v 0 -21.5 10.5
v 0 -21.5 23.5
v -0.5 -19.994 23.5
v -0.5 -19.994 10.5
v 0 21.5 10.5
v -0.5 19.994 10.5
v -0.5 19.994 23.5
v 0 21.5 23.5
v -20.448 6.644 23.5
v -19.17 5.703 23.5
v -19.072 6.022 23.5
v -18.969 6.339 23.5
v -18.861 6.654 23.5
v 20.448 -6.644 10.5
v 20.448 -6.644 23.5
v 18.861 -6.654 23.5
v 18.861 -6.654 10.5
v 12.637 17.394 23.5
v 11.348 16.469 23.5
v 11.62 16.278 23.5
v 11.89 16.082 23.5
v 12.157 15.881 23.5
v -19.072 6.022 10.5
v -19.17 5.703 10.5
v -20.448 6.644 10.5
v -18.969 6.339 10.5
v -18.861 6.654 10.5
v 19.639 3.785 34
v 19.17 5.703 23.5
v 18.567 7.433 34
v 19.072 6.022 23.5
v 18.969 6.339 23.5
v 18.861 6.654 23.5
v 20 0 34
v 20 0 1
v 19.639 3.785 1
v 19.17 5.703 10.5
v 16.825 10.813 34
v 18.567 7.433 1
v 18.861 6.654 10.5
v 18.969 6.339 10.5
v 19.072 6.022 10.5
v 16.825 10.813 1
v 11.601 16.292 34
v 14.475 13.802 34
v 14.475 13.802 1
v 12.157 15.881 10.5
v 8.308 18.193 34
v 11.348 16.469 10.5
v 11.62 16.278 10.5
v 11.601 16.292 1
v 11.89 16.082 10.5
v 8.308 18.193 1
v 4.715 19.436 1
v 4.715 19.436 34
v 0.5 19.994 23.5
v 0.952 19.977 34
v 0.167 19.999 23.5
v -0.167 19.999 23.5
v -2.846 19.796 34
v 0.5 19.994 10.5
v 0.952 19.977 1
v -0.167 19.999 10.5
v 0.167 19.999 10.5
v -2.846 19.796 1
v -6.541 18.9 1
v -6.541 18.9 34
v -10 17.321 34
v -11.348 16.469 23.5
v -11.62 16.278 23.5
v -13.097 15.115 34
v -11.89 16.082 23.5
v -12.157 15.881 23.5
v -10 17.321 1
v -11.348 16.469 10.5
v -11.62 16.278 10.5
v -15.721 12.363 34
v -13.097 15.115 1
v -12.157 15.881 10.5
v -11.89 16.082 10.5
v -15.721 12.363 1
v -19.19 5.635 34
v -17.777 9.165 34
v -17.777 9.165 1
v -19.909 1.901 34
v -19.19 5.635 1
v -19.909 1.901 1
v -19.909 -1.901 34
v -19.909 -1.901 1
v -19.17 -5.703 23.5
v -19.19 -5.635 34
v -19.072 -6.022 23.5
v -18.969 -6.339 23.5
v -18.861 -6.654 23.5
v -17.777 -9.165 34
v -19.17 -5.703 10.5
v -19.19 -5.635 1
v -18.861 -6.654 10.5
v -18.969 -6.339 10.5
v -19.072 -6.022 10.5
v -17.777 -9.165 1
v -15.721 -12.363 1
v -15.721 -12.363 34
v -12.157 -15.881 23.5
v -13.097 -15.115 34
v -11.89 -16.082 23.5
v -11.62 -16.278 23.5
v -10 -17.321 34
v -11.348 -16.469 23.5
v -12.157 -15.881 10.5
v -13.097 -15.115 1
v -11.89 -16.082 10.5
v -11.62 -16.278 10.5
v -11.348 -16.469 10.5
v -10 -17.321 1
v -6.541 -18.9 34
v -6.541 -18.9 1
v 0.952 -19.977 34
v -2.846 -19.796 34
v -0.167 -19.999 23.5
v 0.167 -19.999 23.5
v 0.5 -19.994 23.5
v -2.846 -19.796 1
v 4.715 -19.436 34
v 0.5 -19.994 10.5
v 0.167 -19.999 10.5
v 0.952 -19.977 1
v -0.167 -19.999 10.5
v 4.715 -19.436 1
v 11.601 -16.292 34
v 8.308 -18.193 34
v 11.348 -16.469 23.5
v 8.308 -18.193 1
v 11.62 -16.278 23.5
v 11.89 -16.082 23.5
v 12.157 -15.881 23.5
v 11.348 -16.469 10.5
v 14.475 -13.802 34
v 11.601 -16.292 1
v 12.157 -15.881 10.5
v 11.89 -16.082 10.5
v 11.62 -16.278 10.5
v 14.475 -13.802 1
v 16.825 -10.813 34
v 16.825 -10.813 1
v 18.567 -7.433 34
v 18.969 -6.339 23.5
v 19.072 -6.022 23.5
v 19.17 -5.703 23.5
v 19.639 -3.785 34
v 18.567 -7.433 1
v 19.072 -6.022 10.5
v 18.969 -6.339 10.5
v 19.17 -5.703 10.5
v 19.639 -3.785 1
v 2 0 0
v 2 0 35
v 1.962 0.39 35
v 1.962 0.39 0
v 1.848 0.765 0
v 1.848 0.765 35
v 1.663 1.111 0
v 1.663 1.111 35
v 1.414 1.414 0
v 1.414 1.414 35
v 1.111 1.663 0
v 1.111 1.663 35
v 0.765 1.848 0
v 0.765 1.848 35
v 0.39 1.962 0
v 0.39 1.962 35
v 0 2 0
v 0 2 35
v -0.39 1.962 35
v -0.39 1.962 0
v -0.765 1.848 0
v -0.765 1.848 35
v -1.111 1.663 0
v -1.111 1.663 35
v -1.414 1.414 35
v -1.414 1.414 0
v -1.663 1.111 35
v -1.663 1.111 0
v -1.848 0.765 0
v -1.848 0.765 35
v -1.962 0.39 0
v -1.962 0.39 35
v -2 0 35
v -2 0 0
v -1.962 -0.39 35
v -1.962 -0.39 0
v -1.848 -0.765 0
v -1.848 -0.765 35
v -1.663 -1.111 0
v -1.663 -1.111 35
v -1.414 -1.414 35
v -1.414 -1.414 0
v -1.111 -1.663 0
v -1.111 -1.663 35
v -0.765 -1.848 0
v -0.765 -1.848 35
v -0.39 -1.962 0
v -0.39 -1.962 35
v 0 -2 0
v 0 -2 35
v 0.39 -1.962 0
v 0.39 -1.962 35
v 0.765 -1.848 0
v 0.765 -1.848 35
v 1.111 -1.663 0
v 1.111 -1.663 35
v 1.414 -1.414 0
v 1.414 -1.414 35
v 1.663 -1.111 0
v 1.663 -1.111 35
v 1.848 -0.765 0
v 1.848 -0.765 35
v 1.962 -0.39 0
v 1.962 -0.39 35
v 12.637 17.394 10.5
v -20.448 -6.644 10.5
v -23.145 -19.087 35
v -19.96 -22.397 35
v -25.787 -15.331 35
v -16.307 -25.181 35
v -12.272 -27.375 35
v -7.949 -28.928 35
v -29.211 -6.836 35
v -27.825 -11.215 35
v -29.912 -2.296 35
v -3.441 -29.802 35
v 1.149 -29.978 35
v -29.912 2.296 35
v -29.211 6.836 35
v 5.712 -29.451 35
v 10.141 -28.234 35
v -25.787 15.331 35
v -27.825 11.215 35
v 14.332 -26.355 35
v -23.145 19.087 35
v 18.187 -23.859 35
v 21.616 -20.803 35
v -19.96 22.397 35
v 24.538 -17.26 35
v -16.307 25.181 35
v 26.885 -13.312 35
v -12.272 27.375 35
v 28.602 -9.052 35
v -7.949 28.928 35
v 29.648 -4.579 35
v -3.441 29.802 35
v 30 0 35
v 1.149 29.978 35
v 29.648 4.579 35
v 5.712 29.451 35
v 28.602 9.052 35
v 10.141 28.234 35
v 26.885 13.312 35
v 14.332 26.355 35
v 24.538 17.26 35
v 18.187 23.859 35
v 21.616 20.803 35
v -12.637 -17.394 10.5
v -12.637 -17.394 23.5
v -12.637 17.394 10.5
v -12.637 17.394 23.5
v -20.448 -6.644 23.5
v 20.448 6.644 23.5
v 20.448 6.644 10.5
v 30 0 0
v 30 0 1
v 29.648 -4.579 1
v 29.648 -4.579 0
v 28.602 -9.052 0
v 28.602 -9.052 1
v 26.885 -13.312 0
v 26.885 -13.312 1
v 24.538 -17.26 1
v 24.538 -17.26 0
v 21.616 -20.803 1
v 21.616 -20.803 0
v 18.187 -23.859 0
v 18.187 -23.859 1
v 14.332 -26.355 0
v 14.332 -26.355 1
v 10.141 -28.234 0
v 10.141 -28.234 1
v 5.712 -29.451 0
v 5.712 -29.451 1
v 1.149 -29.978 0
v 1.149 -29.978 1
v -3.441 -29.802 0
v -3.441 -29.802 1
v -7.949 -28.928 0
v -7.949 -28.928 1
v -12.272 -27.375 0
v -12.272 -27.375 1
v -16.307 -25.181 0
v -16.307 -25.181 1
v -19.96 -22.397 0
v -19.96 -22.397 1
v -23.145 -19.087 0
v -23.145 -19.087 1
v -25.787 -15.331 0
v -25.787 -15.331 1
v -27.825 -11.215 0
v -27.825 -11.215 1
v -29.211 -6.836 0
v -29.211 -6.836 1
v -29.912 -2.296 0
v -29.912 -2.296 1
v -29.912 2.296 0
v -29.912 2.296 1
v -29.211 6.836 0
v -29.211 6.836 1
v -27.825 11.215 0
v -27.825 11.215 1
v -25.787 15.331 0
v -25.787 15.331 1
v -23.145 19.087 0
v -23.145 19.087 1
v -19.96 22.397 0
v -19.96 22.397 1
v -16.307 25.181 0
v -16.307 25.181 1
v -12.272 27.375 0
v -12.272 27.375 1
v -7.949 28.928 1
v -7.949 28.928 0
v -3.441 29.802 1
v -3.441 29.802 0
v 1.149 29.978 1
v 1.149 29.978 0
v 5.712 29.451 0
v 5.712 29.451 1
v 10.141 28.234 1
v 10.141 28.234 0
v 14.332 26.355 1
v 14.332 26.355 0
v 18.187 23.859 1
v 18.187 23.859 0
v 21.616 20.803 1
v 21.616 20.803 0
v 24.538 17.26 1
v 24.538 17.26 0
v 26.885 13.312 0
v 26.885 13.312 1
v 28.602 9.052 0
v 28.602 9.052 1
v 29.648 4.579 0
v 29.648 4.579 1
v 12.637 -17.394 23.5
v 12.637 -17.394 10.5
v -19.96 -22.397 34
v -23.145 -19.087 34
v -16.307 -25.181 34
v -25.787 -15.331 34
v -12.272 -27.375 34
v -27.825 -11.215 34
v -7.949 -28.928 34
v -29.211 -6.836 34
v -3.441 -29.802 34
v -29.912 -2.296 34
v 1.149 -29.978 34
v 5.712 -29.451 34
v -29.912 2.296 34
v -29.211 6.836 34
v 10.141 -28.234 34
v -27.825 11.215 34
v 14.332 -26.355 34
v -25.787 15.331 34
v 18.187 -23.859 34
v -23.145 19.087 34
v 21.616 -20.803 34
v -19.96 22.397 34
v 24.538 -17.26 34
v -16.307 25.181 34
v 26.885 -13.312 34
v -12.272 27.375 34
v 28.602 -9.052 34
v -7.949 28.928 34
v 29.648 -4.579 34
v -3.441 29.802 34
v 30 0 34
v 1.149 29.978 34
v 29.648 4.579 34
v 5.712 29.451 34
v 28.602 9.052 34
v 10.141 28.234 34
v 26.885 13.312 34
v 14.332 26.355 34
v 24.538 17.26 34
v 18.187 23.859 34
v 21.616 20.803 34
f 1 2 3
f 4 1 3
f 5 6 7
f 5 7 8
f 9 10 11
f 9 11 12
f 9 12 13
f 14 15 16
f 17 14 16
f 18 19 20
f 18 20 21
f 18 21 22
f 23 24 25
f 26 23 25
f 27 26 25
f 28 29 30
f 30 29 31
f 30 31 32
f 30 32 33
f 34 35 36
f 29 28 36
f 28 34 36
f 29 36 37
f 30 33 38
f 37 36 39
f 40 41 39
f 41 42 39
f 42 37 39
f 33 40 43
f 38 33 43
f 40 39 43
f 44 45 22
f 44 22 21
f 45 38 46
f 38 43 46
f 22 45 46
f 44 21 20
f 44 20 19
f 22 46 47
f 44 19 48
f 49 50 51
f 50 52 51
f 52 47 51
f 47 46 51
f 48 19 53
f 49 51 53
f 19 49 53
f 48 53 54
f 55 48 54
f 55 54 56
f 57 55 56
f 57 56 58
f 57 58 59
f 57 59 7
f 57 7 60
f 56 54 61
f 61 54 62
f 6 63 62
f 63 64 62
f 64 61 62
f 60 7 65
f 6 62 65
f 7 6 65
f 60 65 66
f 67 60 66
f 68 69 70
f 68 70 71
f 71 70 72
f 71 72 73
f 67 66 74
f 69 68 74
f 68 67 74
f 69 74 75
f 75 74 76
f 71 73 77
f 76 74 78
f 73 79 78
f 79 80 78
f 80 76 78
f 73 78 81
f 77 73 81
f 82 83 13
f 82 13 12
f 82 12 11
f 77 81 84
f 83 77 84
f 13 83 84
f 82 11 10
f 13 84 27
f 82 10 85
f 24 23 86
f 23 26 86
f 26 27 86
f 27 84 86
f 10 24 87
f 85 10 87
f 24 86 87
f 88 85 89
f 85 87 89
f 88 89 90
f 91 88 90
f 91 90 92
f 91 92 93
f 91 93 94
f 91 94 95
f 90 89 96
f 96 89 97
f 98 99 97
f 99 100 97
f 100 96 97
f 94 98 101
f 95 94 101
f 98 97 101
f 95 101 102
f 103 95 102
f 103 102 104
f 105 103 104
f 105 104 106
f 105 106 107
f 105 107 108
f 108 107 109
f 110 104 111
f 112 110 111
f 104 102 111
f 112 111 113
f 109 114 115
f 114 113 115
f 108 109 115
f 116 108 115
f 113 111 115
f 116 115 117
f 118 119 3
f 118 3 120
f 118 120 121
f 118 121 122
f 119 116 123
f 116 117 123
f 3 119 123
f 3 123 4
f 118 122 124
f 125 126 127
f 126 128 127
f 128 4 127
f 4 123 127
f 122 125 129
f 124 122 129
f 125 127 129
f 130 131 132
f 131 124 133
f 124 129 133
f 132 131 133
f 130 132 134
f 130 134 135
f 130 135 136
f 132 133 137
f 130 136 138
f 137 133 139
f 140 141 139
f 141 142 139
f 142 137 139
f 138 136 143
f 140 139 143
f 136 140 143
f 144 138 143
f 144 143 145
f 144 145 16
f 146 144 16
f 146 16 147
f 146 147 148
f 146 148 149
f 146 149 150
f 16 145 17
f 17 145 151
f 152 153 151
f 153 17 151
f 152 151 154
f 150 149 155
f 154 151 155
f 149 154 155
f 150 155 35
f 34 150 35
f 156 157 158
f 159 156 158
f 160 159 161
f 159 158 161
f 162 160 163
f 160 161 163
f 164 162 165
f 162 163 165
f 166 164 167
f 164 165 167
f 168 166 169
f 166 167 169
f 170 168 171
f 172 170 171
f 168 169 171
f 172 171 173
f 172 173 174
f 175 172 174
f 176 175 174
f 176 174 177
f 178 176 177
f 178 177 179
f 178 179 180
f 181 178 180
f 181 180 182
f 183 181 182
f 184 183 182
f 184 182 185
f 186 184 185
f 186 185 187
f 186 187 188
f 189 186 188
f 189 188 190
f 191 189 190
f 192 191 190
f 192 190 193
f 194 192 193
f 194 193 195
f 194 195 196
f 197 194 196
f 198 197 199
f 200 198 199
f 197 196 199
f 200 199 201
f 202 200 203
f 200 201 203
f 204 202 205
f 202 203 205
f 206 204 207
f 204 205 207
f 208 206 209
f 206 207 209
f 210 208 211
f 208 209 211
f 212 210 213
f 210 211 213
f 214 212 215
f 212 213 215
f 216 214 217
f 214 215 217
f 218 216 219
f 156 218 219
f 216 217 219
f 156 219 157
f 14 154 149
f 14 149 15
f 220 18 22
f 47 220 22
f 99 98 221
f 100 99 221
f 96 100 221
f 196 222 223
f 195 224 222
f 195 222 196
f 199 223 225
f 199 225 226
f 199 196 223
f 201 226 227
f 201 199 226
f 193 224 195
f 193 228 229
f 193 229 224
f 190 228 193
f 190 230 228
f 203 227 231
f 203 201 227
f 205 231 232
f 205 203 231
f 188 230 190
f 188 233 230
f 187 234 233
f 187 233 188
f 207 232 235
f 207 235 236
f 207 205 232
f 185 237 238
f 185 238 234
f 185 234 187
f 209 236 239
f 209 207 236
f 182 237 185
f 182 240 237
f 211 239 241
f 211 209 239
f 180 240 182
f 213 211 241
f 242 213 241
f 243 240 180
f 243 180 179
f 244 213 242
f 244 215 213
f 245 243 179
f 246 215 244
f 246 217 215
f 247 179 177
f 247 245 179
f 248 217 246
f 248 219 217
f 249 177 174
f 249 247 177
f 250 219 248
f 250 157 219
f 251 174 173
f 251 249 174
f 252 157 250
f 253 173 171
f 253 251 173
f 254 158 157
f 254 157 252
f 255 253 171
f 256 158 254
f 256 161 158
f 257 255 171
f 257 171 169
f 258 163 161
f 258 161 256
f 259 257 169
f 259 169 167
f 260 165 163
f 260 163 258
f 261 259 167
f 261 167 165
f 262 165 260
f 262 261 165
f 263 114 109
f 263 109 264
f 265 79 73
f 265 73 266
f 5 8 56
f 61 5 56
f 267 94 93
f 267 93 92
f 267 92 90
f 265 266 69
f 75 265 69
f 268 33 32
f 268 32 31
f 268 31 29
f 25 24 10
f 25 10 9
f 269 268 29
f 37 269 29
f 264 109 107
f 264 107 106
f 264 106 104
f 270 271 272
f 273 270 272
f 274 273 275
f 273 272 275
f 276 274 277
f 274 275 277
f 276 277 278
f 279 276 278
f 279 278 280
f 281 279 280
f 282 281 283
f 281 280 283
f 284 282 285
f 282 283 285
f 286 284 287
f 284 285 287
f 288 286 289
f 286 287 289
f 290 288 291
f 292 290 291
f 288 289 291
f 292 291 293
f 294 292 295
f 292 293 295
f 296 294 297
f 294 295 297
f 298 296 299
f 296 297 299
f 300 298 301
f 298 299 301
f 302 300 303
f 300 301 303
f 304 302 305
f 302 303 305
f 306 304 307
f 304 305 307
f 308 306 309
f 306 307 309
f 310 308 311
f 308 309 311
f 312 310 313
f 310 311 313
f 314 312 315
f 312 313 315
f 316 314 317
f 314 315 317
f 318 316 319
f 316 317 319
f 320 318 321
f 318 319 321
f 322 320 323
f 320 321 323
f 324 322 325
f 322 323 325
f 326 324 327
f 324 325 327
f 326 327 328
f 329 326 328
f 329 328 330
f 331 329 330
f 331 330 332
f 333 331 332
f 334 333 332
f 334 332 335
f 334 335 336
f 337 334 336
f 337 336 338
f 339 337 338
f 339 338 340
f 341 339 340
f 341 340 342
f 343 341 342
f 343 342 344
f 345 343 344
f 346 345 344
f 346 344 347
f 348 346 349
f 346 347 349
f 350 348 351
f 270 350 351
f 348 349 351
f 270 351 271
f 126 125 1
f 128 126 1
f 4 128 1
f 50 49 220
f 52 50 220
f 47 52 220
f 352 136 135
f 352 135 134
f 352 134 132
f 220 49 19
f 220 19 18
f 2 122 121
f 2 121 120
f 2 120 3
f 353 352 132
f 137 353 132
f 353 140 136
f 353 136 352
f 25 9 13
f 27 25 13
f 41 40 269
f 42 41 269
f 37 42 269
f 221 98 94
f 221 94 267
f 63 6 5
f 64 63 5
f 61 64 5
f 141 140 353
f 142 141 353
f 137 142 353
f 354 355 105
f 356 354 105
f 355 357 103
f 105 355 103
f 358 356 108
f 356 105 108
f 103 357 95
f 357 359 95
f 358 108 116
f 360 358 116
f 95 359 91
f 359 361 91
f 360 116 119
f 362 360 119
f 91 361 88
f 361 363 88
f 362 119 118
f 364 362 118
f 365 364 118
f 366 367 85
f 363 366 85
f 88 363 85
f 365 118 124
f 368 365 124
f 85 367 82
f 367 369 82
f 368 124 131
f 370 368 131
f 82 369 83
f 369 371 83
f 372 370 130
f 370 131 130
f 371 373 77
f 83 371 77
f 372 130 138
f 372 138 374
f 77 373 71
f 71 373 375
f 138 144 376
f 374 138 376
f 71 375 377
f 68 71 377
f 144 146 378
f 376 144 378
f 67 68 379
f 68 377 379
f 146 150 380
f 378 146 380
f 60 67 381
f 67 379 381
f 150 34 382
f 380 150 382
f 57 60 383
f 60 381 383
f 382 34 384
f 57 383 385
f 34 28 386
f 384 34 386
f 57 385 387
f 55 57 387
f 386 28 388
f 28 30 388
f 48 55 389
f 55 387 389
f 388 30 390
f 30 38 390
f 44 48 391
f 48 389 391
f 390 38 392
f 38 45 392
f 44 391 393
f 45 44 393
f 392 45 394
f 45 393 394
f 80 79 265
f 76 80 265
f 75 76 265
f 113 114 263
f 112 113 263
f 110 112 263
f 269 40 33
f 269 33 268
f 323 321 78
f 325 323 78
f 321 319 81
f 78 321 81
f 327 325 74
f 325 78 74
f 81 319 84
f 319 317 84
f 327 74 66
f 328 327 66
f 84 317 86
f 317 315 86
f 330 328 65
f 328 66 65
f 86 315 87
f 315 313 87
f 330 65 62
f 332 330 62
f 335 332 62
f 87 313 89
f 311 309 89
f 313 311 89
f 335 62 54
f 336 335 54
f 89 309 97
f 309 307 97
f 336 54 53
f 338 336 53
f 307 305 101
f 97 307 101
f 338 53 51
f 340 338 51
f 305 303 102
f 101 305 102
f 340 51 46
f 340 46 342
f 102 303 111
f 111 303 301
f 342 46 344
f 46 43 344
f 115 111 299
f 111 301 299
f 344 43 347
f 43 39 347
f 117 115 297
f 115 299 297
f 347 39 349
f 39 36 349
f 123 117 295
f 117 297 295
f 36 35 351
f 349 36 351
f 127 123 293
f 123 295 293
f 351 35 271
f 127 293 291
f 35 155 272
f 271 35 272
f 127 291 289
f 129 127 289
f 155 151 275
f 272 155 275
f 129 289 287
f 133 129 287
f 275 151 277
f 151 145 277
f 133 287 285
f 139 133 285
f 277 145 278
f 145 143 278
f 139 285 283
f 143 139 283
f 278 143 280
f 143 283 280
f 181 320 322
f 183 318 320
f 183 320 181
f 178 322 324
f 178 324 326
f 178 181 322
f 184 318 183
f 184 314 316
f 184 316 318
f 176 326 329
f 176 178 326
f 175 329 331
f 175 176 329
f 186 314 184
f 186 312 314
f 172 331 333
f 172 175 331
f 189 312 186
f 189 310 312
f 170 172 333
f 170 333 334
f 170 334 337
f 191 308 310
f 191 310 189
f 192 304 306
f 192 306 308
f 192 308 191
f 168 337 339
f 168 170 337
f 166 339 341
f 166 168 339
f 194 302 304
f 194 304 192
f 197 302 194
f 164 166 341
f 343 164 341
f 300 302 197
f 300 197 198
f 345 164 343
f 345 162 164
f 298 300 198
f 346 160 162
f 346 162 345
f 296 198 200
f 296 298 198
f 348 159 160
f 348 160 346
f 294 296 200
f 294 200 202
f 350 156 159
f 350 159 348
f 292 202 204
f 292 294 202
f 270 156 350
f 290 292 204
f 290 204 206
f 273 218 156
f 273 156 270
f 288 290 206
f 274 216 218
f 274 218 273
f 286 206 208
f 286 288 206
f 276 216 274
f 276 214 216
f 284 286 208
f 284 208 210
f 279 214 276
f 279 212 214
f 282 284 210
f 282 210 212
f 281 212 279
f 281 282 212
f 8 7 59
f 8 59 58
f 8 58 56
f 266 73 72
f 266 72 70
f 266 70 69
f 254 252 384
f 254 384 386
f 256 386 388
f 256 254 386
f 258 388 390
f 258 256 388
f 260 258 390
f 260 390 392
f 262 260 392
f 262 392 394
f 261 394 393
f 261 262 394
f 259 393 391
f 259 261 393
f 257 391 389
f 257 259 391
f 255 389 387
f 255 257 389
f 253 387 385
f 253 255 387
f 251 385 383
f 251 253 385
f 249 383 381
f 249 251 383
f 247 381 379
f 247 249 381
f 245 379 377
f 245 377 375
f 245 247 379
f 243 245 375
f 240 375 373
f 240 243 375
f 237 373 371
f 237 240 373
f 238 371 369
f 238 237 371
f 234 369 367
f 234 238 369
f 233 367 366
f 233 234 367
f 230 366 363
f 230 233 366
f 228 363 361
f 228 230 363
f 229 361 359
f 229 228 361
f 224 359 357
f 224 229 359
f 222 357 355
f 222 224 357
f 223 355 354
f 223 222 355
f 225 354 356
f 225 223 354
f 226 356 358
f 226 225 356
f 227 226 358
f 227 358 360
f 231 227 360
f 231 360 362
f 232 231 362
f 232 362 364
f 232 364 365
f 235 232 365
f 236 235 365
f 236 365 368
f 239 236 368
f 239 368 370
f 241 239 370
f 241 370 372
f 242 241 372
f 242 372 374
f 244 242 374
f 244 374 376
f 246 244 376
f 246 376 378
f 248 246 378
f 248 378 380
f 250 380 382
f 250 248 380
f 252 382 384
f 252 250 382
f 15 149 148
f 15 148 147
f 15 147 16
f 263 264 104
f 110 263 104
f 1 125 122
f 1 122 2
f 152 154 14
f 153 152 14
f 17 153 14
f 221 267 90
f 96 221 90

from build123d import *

# Parameters (mm, degrees)
SKETCH_1_R               = 20
EXTRUDE_1_DEPTH          = 35
SKETCH_3_R               = 30
EXTRUDE_2_DEPTH          = 1
EXTRUDE_START            = -1
SKETCH_4_R               = 30
EXTRUDE_3_DEPTH          = 1
CUT_EXTRUDE_2_DEPTH      = 56
CUT_EXTRUDE_2_DEPTH_BACK = 56
SKETCH_5_W               = 1
SKETCH_5_H               = 13
EXTRUDE_4_DEPTH          = 21.5
CUT_EXTRUDE_3_REACH      = 50.5
PATTERN_CIRCULAR_2_COUNT = 10
CUT_EXTRUDE_5_DEPTH      = 56
CUT_EXTRUDE_5_DEPTH_BACK = 56
SKETCH_9_R               = 5
EXTRUDE_5_DEPTH          = 35
SKETCH_10_R              = 2
CUT_EXTRUDE_6_DEPTH      = 56


with BuildPart() as part:
    # Эскиз1 → Бобышка-Вытянуть1 (new body)
    with BuildSketch(Plane.XY):
        Circle(SKETCH_1_R)
    extrude(amount=EXTRUDE_1_DEPTH)

    # Эскиз3 → Бобышка-Вытянуть2 (add)
    with BuildSketch(Plane.XY.offset(35)):
        Circle(SKETCH_3_R)
    extrude(amount=-EXTRUDE_2_DEPTH)

    # Эскиз4 → Бобышка-Вытянуть3 (add)
    with BuildSketch(Plane(origin=(0, 0, 0), x_dir=(-1, 0, 0), z_dir=(0, 0, -1)).offset(EXTRUDE_START)):
        with Locations(Location((0, 0, 0), (0, 0, 180))):
            Circle(SKETCH_4_R)
    extrude(amount=EXTRUDE_3_DEPTH)

    # Эскиз2 → Вырез-Вытянуть2 (cut, two sides: drawn at the far end of the back side and taken through both)
    with BuildSketch(Plane.XY.offset(35).offset(-CUT_EXTRUDE_2_DEPTH_BACK)):
        with BuildLine():
            Line((-1.944865034, 1.8), (1.944865034, 1.8))
            ThreePointArc((1.944865034, 1.8), (2.65, 0), (1.944865034, -1.8))
            Line((1.944865034, -1.8), (-1.944865034, -1.8))
            ThreePointArc((-1.944865034, -1.8), (-2.65, 0), (-1.944865034, 1.8))
        make_face()
    extrude(amount=CUT_EXTRUDE_2_DEPTH + CUT_EXTRUDE_2_DEPTH_BACK, mode=Mode.SUBTRACT)

    # Эскиз5 → Бобышка-Вытянуть4 (add)
    with BuildSketch(Plane(origin=(0, 0, 0), x_dir=(1, 0, 0), z_dir=(0, 1, 0))):
        with Locations((0, -17)):
            Rectangle(SKETCH_5_W, SKETCH_5_H)
    extrude_4 = extrude(amount=EXTRUDE_4_DEPTH)

    # Эскиз6 → Вырез-Вытянуть3 (cut, up to next)
    with BuildSketch(Plane.XY.offset(23.5), mode=Mode.PRIVATE) as cut_extrude_3_sk1:
        Polygon((-0.5, 19.993749023), (0, 21.5), (-0.5, 21.5), align=None)
    cut_extrude_3_tool1 = extrude(cut_extrude_3_sk1.sketch, amount=-CUT_EXTRUDE_3_REACH, mode=Mode.PRIVATE) & part.part
    # Эскиз6 → Вырез-Вытянуть3 (cut, up to next)
    with BuildSketch(Plane.XY.offset(23.5), mode=Mode.PRIVATE) as cut_extrude_3_sk2:
        Polygon((0.5, 21.5), (0, 21.5), (0.5, 19.993749023), align=None)
    cut_extrude_3_tool2 = extrude(cut_extrude_3_sk2.sketch, amount=-CUT_EXTRUDE_3_REACH, mode=Mode.PRIVATE) & part.part
    cut_extrude_3_1 = cut_extrude_3_tool1.solids().sort_by_distance((-0.333333, 20.997916, 23.5))[0]
    add(cut_extrude_3_1, mode=Mode.SUBTRACT)
    cut_extrude_3_2 = cut_extrude_3_tool2.solids().sort_by_distance((0.333333, 20.997916, 23.5))[0]
    add(cut_extrude_3_2, mode=Mode.SUBTRACT)
    cut_extrude_3 = cut_extrude_3_1 + cut_extrude_3_2  # Вырез-Вытянуть3 as one shape, for the pattern or mirror that repeats it

    # Круговой массив2: Бобышка-Вытянуть4, Вырез-Вытянуть3 ×10 about axis
    pattern_circular_2_axis = Axis((0, 0, 0), (0, 0, 1))
    add([extrude_4.rotate(pattern_circular_2_axis, i * 360 / PATTERN_CIRCULAR_2_COUNT) for i in range(1, PATTERN_CIRCULAR_2_COUNT)])
    add([cut_extrude_3.rotate(pattern_circular_2_axis, i * 360 / PATTERN_CIRCULAR_2_COUNT) for i in range(1, PATTERN_CIRCULAR_2_COUNT)], mode=Mode.SUBTRACT)

    # Эскиз8 → Вырез-Вытянуть5 (cut, two sides: drawn at the far end of the back side and taken through both)
    with BuildSketch(Plane.XY.offset(35).offset(-CUT_EXTRUDE_5_DEPTH_BACK)):
        with BuildLine():
            ThreePointArc((-1.944865034, -1.8), (-2.65, 0), (-1.944865034, 1.8))
            Line((-1.944865034, 1.8), (1.944865034, 1.8))
            ThreePointArc((1.944865034, 1.8), (2.65, 0), (1.944865034, -1.8))
            Line((1.944865034, -1.8), (-1.944865034, -1.8))
        make_face()
    extrude(amount=CUT_EXTRUDE_5_DEPTH + CUT_EXTRUDE_5_DEPTH_BACK, mode=Mode.SUBTRACT)

    # Эскиз9 → Бобышка-Вытянуть5 (add, through all)
    with BuildSketch(Plane.XY.offset(35)):
        Circle(SKETCH_9_R)
    extrude(amount=-EXTRUDE_5_DEPTH)

    # Эскиз10 → Вырез-Вытянуть6 (cut, through all)
    with BuildSketch(Plane.XY.offset(35)):
        Circle(SKETCH_10_R)
    extrude(amount=-CUT_EXTRUDE_6_DEPTH, mode=Mode.SUBTRACT)


solid = part.part
